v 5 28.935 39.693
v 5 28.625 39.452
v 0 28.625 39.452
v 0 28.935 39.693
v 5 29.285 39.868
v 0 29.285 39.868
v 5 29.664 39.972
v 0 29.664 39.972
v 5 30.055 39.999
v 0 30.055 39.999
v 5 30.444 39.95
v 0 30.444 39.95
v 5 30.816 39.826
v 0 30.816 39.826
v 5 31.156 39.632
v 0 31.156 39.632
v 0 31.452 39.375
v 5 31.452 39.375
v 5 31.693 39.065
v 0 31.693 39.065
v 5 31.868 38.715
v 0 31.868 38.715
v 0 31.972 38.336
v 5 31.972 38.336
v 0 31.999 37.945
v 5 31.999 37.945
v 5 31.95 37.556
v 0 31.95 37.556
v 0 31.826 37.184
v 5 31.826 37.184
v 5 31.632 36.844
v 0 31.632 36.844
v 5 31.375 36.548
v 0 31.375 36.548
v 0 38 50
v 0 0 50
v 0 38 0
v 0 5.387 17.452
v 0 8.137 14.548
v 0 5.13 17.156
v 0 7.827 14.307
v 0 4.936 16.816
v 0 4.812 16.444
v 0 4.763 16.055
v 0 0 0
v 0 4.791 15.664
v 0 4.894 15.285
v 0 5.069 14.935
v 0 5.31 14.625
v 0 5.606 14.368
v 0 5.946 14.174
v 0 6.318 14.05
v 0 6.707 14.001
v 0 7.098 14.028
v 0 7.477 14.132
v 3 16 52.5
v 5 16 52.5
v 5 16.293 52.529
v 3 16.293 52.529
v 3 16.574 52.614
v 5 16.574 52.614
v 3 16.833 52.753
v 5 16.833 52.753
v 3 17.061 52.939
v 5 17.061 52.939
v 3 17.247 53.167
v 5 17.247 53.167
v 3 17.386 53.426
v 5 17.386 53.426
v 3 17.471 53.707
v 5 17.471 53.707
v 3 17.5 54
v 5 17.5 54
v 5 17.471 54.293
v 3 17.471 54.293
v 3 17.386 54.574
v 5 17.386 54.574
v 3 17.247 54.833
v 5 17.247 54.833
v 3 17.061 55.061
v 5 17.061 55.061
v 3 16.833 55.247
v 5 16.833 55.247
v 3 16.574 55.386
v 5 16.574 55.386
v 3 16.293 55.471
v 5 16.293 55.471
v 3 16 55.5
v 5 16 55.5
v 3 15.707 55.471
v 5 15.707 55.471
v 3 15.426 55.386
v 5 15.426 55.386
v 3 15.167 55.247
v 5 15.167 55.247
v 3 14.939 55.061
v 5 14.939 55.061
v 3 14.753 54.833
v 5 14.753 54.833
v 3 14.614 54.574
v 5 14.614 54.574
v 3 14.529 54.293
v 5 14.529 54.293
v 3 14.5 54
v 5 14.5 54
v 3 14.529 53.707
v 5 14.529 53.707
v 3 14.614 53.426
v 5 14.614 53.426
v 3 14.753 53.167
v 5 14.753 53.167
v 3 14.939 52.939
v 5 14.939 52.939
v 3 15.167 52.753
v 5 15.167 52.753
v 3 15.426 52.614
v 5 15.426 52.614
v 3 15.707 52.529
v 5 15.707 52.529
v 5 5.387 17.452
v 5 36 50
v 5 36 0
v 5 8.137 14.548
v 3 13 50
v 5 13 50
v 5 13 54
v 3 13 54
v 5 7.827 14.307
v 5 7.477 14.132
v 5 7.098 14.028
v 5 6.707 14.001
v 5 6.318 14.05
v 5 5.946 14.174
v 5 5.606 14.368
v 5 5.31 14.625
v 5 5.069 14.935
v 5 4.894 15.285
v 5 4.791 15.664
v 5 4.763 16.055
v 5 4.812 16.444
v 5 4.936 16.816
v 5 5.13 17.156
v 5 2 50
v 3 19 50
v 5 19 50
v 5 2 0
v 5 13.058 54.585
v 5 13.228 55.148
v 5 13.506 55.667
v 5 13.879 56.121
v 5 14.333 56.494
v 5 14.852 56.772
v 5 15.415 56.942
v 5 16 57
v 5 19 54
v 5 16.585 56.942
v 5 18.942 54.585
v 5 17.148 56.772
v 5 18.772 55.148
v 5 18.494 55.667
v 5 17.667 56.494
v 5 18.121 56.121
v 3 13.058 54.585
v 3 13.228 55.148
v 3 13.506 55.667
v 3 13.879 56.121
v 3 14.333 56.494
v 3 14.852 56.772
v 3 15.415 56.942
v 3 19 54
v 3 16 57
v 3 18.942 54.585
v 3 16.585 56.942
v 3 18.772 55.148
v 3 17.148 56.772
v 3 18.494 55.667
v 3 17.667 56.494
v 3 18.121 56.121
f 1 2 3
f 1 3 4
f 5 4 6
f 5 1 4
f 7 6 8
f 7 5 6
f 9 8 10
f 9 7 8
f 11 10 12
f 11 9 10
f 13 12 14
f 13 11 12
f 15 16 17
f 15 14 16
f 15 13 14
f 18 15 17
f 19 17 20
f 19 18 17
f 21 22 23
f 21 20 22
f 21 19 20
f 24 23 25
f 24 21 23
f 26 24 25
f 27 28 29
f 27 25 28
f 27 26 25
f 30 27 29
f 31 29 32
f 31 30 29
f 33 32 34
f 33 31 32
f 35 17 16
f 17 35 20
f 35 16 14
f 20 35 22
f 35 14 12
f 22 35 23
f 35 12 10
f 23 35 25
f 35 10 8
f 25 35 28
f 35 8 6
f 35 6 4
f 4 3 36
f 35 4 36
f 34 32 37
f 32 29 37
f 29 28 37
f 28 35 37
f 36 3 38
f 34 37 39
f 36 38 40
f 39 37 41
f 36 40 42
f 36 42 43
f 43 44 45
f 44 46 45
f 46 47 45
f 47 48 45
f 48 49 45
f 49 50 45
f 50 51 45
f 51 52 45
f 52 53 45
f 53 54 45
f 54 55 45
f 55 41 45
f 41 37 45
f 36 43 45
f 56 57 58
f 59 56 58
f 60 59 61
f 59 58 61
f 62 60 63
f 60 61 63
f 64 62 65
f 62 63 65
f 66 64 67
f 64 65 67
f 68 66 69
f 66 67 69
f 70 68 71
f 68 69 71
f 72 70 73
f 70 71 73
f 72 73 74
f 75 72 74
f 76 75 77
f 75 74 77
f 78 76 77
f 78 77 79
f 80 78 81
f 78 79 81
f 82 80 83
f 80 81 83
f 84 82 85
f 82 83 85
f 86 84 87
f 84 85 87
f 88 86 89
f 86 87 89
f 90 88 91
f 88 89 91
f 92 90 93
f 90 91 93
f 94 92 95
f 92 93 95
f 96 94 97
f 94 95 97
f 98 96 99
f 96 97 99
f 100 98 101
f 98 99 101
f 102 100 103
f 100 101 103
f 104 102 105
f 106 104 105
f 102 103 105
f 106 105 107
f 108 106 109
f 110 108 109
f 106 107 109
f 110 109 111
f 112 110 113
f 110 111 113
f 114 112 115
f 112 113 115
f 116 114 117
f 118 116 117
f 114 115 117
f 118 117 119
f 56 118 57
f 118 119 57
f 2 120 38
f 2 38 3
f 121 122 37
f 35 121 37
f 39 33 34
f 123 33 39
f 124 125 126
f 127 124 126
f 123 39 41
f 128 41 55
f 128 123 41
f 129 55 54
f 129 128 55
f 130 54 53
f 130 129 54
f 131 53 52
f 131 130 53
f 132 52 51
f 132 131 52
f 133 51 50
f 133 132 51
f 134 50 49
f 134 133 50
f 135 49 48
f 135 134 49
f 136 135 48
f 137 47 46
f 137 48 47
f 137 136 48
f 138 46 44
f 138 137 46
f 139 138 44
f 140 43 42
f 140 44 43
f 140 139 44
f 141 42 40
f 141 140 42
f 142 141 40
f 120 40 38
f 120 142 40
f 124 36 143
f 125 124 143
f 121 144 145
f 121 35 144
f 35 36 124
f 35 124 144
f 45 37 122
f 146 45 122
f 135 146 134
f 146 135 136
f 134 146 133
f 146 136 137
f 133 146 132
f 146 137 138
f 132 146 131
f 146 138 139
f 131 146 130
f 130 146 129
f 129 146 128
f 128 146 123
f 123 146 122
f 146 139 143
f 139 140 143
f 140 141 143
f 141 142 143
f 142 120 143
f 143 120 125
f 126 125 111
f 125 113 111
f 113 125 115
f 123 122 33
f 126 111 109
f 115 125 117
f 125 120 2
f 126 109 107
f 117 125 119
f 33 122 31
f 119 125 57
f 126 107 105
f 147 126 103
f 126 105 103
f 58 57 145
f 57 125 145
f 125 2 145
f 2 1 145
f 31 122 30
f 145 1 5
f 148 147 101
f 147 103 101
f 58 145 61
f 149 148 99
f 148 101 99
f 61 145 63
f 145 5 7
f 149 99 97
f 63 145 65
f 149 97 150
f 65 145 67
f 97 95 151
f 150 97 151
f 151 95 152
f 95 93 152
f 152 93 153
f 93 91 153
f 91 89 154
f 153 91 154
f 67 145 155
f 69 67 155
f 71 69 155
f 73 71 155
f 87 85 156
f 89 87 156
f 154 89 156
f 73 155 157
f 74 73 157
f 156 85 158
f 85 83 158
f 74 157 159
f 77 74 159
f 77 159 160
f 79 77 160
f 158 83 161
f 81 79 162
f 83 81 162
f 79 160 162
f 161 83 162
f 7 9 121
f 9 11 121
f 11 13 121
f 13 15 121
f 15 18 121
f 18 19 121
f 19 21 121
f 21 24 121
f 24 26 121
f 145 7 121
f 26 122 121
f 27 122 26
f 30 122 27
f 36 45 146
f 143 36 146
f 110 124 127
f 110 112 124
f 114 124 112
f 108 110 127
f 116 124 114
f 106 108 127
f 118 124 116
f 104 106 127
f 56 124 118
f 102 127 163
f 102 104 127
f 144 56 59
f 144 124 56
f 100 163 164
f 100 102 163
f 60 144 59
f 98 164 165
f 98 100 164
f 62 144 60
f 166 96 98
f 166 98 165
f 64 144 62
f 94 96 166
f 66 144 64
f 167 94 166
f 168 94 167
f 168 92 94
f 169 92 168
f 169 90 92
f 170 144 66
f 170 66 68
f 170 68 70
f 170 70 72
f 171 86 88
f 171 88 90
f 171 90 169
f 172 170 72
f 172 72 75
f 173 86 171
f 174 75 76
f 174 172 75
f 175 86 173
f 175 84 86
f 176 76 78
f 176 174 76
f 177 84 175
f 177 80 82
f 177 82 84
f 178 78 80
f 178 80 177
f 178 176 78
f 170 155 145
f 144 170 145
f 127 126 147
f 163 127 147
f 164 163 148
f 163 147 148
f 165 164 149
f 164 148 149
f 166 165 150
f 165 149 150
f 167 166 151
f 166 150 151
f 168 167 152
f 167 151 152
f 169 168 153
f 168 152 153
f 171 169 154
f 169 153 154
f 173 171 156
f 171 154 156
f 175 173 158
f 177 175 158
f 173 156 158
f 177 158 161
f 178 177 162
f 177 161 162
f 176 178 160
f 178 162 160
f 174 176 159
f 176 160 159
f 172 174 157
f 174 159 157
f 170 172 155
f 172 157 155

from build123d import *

# Parameters (mm, degrees)
BOSS_EXTRUDE1_DEPTH = 50
SKETCH2_R           = 1.5
BOSS_EXTRUDE2_DEPTH = 2
CUT_EXTRUDE1_DEPTH  = 6


with BuildPart() as part:
    # Sketch1 → Boss-Extrude1 (new body)
    with BuildSketch(Plane.XY):
        Polygon((5, 36), (0, 38), (0, 0), (5, 2), align=None)
    extrude(amount=BOSS_EXTRUDE1_DEPTH)

    # Sketch2 → Boss-Extrude2 (add)
    with BuildSketch(Plane(origin=(5, 0, 0), x_dir=(0, 0, -1), z_dir=(1, 0, 0))):
        with BuildLine():
            Line((-50, 13), (-54, 13))
            ThreePointArc((-54, 13), (-57, 16), (-54, 19))
            Line((-54, 19), (-50, 19))
            ThreePointArc((-50, 19), (-47, 16), (-50, 13))
        make_face()
        with Locations((-54, 16)):
            Circle(SKETCH2_R, mode=Mode.SUBTRACT)
    extrude(amount=-BOSS_EXTRUDE2_DEPTH)

    # Sketch3 → Cut-Extrude1 (cut, through all)
    with BuildSketch(Plane(origin=(5, 0, 0), x_dir=(0, 0, -1), z_dir=(1, 0, 0))):
        with BuildLine():
            Line((-36.547631245, 31.375), (-14.547631245, 8.137099923))
            ThreePointArc((-14.547631245, 8.137099923), (-14.625, 5.309731168), (-17.452368755, 5.387099923))
            Line((-17.452368755, 5.387099923), (-39.452368755, 28.625))
            ThreePointArc((-39.452368755, 28.625), (-39.375, 31.452368755), (-36.547631245, 31.375))
        make_face()
    extrude(amount=-CUT_EXTRUDE1_DEPTH, mode=Mode.SUBTRACT)


solid = part.part
